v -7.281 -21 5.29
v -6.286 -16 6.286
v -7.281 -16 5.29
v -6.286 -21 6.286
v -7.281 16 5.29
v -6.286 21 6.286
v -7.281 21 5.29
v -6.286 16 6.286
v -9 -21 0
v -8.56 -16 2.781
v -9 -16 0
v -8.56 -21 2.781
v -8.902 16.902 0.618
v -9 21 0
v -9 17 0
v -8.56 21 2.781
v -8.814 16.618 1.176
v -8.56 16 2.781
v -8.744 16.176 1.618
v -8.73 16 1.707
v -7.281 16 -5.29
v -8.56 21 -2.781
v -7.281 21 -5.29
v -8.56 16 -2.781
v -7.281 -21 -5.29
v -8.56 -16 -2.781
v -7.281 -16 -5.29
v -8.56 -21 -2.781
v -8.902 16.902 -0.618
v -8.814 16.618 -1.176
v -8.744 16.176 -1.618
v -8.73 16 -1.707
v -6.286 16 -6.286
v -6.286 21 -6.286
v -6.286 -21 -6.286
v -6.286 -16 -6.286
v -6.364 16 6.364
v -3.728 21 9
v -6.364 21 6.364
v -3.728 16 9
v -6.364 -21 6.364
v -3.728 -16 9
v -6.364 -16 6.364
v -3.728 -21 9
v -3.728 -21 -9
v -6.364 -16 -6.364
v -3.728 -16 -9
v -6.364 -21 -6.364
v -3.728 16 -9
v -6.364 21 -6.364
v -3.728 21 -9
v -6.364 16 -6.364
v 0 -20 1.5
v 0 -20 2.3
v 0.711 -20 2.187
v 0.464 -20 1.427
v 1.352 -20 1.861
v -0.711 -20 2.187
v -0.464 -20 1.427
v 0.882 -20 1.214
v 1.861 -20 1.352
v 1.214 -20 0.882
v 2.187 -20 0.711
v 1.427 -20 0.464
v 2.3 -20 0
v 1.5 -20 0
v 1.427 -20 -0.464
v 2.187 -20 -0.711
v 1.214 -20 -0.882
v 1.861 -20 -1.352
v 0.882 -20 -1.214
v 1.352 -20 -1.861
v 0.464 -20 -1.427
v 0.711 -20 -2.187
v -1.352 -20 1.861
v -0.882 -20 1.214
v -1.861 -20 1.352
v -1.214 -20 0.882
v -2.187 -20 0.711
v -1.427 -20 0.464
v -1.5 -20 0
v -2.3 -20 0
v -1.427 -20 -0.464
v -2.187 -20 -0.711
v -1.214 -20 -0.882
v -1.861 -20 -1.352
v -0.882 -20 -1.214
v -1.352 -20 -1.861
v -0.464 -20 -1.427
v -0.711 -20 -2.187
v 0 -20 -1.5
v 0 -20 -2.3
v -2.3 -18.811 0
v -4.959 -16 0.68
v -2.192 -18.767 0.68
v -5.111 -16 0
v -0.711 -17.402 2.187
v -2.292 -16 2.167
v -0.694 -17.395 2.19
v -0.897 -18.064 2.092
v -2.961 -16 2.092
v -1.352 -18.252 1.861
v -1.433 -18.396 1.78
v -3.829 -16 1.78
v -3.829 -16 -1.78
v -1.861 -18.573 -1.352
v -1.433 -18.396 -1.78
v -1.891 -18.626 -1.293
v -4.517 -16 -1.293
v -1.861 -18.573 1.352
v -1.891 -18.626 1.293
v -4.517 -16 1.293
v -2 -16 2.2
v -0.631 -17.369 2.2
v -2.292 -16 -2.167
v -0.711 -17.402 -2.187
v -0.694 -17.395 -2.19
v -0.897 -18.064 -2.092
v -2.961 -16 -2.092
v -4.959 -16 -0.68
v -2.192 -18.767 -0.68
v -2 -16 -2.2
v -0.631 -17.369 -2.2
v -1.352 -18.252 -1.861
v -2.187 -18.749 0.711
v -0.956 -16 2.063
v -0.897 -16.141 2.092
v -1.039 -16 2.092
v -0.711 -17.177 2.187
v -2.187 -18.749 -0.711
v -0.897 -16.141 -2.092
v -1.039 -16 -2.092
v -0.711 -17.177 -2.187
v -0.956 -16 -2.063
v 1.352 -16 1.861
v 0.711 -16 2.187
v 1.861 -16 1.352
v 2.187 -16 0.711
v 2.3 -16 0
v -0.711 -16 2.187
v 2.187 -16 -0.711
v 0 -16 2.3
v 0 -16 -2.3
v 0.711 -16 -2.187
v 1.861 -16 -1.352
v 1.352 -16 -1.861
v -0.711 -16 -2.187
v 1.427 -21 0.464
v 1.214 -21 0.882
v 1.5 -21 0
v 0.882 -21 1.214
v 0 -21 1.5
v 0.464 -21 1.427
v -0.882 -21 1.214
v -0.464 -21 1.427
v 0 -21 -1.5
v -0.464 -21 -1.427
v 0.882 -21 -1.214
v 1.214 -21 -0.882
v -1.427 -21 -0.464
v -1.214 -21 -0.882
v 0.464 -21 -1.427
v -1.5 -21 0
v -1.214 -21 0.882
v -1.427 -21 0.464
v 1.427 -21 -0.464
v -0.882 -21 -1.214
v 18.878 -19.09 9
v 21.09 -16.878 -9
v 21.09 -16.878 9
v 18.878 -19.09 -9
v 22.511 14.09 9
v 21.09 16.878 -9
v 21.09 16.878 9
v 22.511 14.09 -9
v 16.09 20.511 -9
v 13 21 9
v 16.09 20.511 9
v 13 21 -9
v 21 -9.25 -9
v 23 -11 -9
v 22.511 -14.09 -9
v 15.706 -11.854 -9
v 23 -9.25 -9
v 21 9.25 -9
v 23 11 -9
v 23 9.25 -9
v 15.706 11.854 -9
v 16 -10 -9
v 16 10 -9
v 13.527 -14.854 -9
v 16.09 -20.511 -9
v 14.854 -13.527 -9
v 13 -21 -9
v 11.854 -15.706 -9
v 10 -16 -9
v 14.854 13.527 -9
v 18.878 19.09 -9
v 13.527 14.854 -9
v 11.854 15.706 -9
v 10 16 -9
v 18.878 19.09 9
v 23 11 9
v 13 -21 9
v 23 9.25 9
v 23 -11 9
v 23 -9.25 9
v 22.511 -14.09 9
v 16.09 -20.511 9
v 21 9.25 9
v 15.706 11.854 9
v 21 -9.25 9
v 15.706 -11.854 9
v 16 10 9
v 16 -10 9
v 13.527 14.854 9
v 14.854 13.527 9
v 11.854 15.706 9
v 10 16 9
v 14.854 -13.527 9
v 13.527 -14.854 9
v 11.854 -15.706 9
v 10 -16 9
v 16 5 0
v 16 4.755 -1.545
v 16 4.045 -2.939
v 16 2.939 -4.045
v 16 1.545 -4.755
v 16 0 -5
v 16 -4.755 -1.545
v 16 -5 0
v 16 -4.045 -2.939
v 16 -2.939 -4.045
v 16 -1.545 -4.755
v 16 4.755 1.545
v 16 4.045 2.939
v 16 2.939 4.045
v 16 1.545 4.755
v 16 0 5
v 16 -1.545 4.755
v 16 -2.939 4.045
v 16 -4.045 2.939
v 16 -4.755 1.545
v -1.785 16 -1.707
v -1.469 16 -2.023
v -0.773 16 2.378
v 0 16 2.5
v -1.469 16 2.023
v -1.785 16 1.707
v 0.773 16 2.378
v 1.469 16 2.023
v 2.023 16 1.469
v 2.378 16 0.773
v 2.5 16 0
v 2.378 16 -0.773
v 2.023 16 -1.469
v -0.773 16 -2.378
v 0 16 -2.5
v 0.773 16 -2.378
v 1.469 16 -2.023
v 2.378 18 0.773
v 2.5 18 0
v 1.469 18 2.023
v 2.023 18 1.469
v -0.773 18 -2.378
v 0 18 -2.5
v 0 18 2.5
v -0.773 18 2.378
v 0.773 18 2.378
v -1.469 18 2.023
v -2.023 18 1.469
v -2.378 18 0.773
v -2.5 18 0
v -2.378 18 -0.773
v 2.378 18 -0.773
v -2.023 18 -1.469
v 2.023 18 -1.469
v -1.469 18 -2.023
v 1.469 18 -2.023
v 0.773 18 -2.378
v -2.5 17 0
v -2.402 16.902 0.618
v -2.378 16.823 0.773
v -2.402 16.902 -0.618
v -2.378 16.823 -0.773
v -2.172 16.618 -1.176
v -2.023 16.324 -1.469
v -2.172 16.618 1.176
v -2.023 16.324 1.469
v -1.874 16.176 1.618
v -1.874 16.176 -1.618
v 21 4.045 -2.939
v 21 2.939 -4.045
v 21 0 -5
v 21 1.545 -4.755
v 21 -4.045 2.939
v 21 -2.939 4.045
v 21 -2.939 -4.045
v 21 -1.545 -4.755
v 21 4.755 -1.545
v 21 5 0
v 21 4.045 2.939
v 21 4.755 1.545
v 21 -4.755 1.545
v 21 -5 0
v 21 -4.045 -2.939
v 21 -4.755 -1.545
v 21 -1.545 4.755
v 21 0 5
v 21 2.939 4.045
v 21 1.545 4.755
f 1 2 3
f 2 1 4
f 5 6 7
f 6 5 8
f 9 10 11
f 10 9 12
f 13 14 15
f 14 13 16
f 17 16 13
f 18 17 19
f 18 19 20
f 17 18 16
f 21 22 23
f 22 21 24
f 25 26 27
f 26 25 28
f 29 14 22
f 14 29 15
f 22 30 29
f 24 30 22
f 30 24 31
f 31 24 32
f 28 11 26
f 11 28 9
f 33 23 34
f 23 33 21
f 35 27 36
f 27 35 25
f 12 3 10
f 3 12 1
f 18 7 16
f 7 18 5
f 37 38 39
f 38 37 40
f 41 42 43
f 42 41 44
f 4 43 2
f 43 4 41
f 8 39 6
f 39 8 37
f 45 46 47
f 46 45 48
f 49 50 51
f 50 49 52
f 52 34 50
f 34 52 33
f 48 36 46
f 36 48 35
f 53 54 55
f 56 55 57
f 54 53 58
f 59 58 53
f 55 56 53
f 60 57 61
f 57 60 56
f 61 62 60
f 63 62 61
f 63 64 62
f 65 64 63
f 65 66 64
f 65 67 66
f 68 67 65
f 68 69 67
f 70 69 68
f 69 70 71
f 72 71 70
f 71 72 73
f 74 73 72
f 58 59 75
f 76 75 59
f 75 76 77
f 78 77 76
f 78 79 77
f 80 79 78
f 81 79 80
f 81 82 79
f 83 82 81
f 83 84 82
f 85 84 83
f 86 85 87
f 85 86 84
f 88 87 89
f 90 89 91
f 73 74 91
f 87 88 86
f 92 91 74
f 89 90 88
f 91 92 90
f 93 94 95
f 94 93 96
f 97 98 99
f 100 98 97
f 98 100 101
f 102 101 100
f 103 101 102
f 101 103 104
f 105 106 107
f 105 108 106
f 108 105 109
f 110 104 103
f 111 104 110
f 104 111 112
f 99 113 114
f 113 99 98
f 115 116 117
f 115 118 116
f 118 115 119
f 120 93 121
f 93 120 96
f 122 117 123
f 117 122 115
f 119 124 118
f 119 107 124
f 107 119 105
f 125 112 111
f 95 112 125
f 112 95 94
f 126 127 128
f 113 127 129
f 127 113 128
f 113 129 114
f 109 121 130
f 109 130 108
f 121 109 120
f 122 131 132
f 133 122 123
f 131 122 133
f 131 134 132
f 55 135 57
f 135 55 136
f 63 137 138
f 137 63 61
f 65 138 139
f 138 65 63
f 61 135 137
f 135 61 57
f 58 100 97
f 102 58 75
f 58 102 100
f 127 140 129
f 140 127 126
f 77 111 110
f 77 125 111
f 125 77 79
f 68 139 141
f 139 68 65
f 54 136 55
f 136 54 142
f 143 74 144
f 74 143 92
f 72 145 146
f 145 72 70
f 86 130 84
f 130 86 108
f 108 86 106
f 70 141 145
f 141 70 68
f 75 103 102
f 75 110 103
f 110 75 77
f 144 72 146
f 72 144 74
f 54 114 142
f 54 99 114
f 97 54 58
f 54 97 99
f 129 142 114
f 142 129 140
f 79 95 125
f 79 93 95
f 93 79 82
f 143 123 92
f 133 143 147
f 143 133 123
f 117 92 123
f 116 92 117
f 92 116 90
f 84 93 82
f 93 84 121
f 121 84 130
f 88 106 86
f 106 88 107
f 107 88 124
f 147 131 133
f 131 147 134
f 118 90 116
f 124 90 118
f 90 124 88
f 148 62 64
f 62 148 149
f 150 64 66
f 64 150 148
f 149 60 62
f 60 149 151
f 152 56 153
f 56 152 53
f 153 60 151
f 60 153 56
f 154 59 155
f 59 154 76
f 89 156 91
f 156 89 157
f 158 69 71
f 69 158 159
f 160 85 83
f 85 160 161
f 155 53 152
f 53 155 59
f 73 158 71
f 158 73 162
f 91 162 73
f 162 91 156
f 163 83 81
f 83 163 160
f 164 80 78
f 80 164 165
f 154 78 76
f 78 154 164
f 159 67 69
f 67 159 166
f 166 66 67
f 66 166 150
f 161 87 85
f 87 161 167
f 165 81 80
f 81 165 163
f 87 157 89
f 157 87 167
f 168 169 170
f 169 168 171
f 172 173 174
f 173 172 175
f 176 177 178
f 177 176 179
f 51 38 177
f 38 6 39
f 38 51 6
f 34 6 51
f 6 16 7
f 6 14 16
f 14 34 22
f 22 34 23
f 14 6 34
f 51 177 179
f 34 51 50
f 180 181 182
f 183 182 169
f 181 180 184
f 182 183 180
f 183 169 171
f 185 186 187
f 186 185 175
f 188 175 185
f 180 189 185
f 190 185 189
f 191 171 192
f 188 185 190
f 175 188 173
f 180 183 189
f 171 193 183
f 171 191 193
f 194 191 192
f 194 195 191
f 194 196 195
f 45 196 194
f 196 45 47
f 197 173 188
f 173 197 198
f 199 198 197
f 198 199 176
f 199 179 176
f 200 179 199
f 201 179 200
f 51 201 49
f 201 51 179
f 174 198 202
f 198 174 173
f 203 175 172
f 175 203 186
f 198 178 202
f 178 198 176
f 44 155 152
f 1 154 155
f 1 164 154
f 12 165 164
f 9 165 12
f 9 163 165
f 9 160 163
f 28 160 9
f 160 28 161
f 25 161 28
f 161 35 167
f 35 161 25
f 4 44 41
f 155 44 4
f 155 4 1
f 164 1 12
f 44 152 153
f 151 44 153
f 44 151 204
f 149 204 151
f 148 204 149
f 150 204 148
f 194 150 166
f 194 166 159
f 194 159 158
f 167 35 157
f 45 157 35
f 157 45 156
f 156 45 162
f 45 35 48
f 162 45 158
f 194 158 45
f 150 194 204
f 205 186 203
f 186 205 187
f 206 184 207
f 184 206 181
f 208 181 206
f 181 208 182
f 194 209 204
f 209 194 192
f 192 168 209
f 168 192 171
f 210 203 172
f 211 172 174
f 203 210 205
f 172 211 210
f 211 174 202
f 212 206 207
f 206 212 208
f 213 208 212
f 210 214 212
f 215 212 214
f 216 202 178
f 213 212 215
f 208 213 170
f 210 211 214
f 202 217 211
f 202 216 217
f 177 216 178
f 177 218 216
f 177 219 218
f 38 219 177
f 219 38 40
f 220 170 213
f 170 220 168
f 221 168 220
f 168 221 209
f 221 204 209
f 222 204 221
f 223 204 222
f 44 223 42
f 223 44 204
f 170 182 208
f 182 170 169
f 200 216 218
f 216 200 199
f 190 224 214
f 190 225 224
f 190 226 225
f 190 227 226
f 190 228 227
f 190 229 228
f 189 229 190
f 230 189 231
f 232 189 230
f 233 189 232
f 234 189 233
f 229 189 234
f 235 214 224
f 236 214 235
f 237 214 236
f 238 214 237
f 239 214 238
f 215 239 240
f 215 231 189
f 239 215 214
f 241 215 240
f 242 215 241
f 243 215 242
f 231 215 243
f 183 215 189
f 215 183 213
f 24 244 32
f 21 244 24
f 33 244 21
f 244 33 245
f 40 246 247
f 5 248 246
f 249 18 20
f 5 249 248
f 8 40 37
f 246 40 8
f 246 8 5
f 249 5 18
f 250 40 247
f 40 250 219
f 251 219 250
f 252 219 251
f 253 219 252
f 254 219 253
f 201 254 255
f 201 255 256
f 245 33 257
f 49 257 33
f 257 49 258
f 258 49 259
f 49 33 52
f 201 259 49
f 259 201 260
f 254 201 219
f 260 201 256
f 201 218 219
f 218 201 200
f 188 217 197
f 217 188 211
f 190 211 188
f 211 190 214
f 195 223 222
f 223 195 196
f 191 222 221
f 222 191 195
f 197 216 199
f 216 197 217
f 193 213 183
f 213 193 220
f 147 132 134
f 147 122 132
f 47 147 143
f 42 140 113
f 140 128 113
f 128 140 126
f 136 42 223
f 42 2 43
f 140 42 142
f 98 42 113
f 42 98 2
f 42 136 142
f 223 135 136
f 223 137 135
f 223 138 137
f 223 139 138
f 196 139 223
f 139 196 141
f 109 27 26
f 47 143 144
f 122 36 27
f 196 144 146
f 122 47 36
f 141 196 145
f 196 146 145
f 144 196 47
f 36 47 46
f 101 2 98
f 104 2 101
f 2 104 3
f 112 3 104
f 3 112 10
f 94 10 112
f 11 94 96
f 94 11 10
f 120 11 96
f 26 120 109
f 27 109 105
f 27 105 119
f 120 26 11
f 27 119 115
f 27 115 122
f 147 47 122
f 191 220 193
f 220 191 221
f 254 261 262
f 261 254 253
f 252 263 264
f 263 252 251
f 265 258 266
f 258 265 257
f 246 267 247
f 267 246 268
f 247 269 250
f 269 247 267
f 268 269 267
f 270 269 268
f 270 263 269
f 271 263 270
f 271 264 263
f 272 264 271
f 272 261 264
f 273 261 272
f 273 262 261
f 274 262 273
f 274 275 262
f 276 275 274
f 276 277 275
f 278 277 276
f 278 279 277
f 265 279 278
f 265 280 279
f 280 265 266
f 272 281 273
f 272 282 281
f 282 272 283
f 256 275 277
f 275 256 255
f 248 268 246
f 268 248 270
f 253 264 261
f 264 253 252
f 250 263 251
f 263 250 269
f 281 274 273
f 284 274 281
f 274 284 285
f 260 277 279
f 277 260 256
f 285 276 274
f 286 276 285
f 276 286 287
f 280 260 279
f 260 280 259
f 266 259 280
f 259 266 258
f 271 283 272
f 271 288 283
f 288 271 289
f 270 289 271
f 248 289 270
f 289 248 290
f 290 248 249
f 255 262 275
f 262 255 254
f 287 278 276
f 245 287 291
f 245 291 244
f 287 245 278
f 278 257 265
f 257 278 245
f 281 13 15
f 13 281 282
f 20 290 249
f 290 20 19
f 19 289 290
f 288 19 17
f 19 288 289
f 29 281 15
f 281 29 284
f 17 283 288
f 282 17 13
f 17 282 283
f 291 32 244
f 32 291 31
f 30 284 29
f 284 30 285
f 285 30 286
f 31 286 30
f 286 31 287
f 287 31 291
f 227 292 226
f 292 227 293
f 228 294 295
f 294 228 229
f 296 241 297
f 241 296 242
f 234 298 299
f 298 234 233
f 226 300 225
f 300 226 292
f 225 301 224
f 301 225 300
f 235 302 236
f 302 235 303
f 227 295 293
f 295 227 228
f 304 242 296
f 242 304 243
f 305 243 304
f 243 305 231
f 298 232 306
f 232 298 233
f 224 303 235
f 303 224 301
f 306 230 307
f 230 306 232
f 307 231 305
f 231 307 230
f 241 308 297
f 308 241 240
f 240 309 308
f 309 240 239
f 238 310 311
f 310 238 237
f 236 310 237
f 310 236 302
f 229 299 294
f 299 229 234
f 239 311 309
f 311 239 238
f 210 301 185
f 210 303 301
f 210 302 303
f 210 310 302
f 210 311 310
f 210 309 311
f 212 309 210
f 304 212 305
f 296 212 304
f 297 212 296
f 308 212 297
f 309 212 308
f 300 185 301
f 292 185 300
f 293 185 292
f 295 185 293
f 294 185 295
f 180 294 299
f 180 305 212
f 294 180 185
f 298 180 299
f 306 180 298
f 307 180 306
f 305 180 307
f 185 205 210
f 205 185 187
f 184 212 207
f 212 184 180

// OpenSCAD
// file: servo.scad
module servo(model="MG90S",forCutout=false,shim=0.05) {
    if (model == "MG90S") {
      bodyDims=[22.8,12.6,18.1];
      cableDims=[20,7.8,3.5];
      flangeDims=[32.44,12.6,2.9];
      topDims=[22.6,12.6,1.0];
      screwHoles=[27.80,0,1];
      topDimples=[[0,5.75,5.6],[9,2.5,5.6]];
      knurledStud=[0,2.4,4.1];
      if (forCutout) {
        minkowski() {
          cube([shim,shim,shim]);
          _servo(bodyDims,cableDims,flangeDims,topDims,screwHoles,topDimples,knurledStud,forCutout);
        }
      } else {
      	color("LightBlue") _servo(bodyDims,cableDims,flangeDims,topDims,screwHoles,topDimples,knurledStud,forCutout);
      }
    }
  }

module _servo(bodyDims,cableDims,flangeDims,topDims,screwHoles,topDimples,knurledStud,forCutout) {
  translate([-topDimples[0][0]-topDimples[0][1],
    -bodyDims[1]/2,
    -bodyDims[2]-flangeDims[2]-topDims[2]-topDimples[0][2]-knurledStud[2]]) {
    if (forCutout) {
      translate([-cableDims[0],(bodyDims[1]-cableDims[1])/2,cableDims[2]]) 
      cube([cableDims[0],cableDims[1],cableDims[1]]);
    }
		cube(bodyDims);
    if (forCutout) {
		  translate([(bodyDims[0]-flangeDims[0])/2,
                (bodyDims[1]-flangeDims[1])/2,
                bodyDims[2]]) union() {
			  cube(flangeDims);
		    for (hole=[[(flangeDims[0]-screwHoles[0])/2,(flangeDims[1]-screwHoles[1])/2],
                   [(flangeDims[0]-screwHoles[0])/2,(flangeDims[1]+screwHoles[1])/2],
                   [(flangeDims[0]+screwHoles[0])/2,(flangeDims[1]-screwHoles[1])/2],
                   [(flangeDims[0]+screwHoles[0])/2,(flangeDims[1]+screwHoles[1])/2]]) {
          translate([hole[0],hole[1],-5]) cylinder(r=screwHoles[2],h=flangeDims[2]+10,$fn=45);
        }
      }
    } else {
		  translate([(bodyDims[0]-flangeDims[0])/2,
              (bodyDims[1]-flangeDims[1])/2,
              bodyDims[2]]) difference() {
			  cube(flangeDims);
		    for (hole=[[(flangeDims[0]-screwHoles[0])/2,(flangeDims[1]-screwHoles[1])/2],
                   [(flangeDims[0]-screwHoles[0])/2,(flangeDims[1]+screwHoles[1])/2],
                   [(flangeDims[0]+screwHoles[0])/2,(flangeDims[1]-screwHoles[1])/2],
                   [(flangeDims[0]+screwHoles[0])/2,(flangeDims[1]+screwHoles[1])/2]]) {
          translate([hole[0],hole[1],-1]) cylinder(r=screwHoles[2],h=flangeDims[2]+2,$fn=45);
        }
      }
    }
		translate([(bodyDims[0]-topDims[0])/2,
              (bodyDims[1]-topDims[1])/2,
              bodyDims[2]+flangeDims[2]]) cube(topDims);
    for(topDimple=topDimples) {
		  translate([(bodyDims[0]-topDims[0])/2+topDimple[0]+topDimple[1],
                  (bodyDims[1]+topDims[1])/4,
                  bodyDims[2]+flangeDims[2]+topDims[2]]) cylinder(r=topDimple[1],h=topDimple[2],$fn=45);
    }
		translate([(bodyDims[0]-topDims[0])/2+topDimples[0][0]+topDimples[0][1]+knurledStud[0],
              (bodyDims[1]+topDims[1])/4,
              bodyDims[2]+flangeDims[2]+topDims[2]+topDimples[0][2]]) cylinder(r=knurledStud[1],h=knurledStud[2],$fn=45);
	}
}
// main file
include<servo.scad>

module fixleg() {
difference() {
union() {
translate([23.4,-16.4,0])rotate(-26.5) import("Flora_Leg.stl");
translate([11,0,10.825])cube([20,12.25,21.75],center=true);
translate([19,0,12.825])cube([4,12.25,25.75],center=true);
}
#translate([0,0,-7.75])rotate([180,0,0])servo(forCutout=true,shim=0.25);
translate([-8,0,11])cube([10,12.6,26],center=true);;
translate([5,0,5])cube([32,12.6,5],center=true);;
}

}

module fixbody() {
difference() {
union() {
rotate([90,0,0])translate([-77,-175.25,-8.5])import("Flora_Body.stl");
translate([24,-60,2.5])cube([10,100,5],center=true);
translate([-24,-60,2.5])cube([10,100,5],center=true);
for (x = [1,-1]) {for (y = [1,0,-1]) {
translate([39*x,-59.75+40*y,24.8])cube([8,12.6,2],center=true);;
}}
}
for (x = [1,-1]) {
for (y = [1,0,-1]) {
translate([40.5*x,-59.75+40*y,-7.75]){
rotate([180,0,90+90*x])servo(forCutout=true,shim=0.25);
translate([0,0,19])rotate([180,0,90+90*x])translate([-8,0,0])cube([10,12.6,26],center=true);;
}
}}
}
//rotate([90,0,0])translate([-77,-175.25,-8.5])import("Flora_Cover.stl");
//rotate([90,0,0])translate([-77,-185.25,-8.5])import("large_battery_cover.stl");
}

module fixknuckle() {
//#rotate([90,0,0])translate([4,-187,-17])import("Flora_Hip.stl");
difference() {
hull() {for (x=[1,-1]) {for (y=[1,-1]) {
translate([(22-10)*x+1,(21-10)*y,0])cylinder(h=18,r=10,center=true);
}}}
hull() {for (x=[1,-1]) {for (y=[1,-1]) {
translate([(17-6)*x-1,(16-6)*y,0])cylinder(h=26,r=6,center=true);
}}}
translate([-15,0,0])difference() {
cube([30,50,30],center=true);
translate([15,0,0])rotate([90,0,0])cylinder(r=9,h=60,center=true);
translate([15,0,0])rotate([0,45,0])translate([-4.5,0,4.5])cube([9,60,9],center=true);
translate([15,0,0])rotate([0,45,0])translate([4.5,0,-4.5])cube([9,60,9],center=true);}

//Pommel socket
translate([0,13,0])rotate([90,0,0])cylinder(r=2.5,h=10,center=true);
translate([-5,15,0])rotate([0,90,0])cylinder(r=2,h=10,center=true);

//Servo socket
translate([0,-15,0]) rotate([90,0,0]) {
cylinder(r=2.2,h=10,center=true);
translate([0,0,3])rotate([0,-135,0])cylinder(r=2.2,h=10);
cylinder(r=2.3,h=10,center=true);
cylinder(r=1.5,h=20,center=true);
}


//Cable passthrough
translate([20,0,0]) rotate([0,90,0]) cylinder(r=5,h=20,center=true);

// Pair lock
translate([26,0,0])cube([10,18.5,20],center=true);
}
}

//rotate([90,0,180])translate([0,0,-11])fixleg();
//fixbody();
fixknuckle();
//rotate([90,0,180])translate([-38,0,0])fixknuckle();
$fn=20;
